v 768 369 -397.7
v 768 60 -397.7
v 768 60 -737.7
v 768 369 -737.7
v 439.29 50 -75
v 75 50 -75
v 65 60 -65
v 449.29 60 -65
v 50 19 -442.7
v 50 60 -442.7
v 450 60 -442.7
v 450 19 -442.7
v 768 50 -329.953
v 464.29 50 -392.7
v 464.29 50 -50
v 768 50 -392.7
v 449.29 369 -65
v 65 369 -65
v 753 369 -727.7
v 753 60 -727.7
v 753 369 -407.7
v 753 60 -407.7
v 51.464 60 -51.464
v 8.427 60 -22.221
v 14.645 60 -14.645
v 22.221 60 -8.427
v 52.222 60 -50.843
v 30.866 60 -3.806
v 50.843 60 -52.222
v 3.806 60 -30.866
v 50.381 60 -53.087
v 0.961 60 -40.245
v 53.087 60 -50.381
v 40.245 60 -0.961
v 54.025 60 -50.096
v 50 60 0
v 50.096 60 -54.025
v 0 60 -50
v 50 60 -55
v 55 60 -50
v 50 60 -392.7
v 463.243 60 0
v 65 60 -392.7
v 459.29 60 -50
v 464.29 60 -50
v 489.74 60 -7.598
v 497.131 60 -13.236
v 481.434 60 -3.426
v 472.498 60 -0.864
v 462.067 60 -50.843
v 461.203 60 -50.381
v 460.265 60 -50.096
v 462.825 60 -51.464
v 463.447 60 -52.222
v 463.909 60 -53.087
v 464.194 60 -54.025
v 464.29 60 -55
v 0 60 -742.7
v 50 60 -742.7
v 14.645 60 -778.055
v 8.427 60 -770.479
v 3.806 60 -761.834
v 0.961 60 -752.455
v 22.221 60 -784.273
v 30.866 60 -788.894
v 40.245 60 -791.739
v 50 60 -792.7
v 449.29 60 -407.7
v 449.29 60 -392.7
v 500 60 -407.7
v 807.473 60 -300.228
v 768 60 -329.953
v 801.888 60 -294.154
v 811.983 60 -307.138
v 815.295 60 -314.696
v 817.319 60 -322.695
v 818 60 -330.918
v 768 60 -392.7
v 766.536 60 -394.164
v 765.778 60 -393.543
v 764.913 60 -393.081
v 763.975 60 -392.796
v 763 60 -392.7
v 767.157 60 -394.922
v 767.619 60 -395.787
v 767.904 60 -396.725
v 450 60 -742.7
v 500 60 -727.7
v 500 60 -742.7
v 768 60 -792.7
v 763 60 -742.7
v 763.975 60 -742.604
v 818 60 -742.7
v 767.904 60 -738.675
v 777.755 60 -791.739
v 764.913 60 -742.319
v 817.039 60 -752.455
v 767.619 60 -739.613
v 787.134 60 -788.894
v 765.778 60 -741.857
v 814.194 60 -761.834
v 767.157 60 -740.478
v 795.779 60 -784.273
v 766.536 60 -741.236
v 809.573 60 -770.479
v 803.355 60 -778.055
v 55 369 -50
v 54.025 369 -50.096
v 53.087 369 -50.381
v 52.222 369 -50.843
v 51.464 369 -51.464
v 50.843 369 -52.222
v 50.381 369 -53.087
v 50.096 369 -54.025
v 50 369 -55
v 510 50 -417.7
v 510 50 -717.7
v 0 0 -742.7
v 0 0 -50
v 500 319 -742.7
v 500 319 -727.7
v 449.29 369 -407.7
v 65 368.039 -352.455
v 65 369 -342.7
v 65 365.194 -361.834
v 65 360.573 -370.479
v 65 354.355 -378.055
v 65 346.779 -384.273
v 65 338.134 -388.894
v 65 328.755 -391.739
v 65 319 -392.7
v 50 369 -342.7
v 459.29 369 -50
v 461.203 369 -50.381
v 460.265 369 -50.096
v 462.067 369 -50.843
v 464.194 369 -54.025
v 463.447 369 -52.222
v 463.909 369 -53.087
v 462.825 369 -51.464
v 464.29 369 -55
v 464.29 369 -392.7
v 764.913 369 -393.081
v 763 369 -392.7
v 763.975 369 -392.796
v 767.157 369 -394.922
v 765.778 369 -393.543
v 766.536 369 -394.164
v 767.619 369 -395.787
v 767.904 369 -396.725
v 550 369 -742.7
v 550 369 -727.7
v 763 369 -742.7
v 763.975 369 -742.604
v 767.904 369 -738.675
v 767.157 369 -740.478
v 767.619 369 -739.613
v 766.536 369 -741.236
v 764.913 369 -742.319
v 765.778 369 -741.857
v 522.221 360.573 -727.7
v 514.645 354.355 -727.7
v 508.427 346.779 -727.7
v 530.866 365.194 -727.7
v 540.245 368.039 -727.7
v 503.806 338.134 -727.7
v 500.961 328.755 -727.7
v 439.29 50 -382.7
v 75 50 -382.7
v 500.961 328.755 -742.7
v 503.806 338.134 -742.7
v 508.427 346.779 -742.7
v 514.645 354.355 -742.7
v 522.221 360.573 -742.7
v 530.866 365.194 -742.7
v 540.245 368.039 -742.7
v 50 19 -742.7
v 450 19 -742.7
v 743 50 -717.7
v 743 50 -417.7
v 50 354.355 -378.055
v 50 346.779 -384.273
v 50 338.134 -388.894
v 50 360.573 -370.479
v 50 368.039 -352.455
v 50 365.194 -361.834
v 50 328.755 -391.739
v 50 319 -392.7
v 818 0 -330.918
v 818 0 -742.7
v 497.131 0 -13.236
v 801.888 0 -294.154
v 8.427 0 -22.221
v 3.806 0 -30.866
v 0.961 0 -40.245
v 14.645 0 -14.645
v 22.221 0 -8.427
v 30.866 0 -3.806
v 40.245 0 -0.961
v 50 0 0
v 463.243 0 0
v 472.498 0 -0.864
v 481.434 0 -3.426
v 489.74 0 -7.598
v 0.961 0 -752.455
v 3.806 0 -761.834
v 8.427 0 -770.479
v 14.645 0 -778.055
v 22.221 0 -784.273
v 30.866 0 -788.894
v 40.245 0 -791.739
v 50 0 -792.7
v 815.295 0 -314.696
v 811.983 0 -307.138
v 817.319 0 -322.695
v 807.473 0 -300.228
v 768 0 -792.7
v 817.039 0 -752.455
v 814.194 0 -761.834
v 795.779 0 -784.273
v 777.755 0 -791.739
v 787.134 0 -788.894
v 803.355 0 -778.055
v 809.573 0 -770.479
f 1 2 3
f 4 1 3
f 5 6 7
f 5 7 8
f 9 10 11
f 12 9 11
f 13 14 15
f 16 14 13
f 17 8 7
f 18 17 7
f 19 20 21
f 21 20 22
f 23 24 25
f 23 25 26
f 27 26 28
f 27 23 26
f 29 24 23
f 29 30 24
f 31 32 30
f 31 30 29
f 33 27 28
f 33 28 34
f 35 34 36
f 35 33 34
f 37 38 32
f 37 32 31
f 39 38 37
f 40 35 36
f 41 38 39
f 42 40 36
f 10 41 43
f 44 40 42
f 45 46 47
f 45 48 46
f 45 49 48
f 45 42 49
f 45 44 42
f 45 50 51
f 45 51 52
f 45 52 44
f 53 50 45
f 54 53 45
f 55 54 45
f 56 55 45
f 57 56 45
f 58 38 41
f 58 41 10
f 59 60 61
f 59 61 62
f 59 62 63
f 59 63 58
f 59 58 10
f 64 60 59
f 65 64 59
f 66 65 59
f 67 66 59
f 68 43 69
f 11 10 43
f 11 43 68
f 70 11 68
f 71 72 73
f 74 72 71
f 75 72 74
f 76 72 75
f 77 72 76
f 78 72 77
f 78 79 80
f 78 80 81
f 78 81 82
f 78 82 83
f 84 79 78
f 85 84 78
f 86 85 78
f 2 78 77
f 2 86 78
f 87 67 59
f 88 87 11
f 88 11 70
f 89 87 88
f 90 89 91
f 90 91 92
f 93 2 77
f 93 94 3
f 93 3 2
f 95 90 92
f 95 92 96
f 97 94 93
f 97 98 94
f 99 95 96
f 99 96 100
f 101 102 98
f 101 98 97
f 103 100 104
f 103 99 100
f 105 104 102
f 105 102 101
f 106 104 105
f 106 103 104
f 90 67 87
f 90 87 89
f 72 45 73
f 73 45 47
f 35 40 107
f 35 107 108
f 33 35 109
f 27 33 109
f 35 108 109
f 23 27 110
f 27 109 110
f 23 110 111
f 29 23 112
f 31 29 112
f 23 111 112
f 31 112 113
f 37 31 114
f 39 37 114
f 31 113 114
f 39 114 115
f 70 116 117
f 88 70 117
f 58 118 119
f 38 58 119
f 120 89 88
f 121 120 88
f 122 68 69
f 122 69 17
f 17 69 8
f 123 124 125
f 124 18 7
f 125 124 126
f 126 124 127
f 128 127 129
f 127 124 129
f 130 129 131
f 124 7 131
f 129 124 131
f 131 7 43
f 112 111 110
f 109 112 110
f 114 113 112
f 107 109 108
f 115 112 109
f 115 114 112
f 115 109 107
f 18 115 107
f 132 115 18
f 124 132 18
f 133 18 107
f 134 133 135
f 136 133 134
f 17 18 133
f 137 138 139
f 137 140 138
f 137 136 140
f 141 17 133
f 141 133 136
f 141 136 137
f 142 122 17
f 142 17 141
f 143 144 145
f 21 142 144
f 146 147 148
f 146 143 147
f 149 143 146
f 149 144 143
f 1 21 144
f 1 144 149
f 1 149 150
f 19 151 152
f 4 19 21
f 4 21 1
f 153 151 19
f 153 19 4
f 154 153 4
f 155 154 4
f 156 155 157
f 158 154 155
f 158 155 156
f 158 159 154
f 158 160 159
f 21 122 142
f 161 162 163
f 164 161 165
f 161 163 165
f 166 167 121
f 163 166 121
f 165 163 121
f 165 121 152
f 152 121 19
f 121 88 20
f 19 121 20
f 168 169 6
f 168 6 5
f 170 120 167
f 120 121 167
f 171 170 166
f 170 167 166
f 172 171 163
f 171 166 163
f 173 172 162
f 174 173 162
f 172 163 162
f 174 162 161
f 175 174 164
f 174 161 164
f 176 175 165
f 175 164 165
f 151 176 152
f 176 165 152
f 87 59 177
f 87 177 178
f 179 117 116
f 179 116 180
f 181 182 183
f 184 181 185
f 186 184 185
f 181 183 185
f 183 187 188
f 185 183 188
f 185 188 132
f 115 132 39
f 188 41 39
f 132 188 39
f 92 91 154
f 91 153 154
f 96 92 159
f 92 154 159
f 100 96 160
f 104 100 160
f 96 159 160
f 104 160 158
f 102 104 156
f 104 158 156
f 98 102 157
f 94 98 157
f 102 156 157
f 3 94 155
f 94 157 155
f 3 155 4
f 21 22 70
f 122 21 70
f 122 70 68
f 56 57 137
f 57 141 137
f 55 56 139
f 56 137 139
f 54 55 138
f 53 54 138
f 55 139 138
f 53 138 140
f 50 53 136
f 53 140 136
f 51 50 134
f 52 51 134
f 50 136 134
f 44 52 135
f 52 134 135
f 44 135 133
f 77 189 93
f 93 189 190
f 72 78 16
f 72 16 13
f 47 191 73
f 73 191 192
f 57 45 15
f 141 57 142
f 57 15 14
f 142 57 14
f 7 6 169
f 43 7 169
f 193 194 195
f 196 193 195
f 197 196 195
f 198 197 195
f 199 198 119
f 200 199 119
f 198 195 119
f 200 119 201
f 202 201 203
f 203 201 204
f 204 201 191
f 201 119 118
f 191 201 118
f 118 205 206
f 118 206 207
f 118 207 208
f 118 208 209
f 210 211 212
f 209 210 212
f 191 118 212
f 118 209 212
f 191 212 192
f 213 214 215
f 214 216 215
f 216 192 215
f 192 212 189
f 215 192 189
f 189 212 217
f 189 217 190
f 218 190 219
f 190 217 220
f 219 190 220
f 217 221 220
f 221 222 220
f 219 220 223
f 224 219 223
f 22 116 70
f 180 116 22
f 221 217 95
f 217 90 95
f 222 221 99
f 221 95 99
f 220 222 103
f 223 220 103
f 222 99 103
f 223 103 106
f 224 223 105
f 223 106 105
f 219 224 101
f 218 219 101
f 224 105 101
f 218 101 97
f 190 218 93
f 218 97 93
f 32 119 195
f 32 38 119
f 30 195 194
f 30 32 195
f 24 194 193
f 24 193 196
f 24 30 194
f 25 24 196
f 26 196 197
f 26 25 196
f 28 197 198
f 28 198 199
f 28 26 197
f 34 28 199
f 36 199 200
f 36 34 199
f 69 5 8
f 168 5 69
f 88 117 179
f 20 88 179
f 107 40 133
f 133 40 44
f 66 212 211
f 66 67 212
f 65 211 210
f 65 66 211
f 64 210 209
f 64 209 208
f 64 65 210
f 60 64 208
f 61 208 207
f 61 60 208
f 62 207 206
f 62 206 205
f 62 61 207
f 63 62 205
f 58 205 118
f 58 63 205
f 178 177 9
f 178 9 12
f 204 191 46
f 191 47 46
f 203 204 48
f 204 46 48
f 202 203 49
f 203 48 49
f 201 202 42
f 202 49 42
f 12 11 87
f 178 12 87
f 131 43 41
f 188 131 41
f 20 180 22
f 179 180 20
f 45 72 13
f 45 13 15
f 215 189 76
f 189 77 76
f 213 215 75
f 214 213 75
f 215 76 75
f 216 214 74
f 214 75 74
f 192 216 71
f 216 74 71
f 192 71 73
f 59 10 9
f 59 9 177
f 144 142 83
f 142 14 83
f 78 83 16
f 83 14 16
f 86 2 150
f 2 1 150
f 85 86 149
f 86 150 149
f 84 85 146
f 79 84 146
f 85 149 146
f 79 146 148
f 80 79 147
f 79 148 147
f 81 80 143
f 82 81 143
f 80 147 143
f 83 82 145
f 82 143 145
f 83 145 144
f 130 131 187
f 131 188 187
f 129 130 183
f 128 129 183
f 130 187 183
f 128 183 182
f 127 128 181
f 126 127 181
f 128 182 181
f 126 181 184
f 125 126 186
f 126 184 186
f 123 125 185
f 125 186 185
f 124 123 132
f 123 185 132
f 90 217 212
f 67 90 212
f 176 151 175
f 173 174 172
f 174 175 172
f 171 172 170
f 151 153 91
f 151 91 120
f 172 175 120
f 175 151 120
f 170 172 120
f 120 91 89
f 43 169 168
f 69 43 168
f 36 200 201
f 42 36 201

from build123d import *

# Parameters (mm, degrees)
BOSS_EXTRUDE1_DEPTH = 60
SKETCH3_W           = 400
SKETCH3_H           = 300
CUT_EXTRUDE1_DEPTH  = 41
BOSS_EXTRUDE2_DEPTH = 350
BOSS_EXTRUDE3_DEPTH = 350
FILLET1_R           = 50
FILLET2_R           = 50
SKETCH6_W           = 253
SKETCH6_H           = 320
SKETCH6_W_2         = 384.289648178
SKETCH6_H_2         = 327.7
BOSS_EXTRUDE4_DEPTH = 31
CHAMFER5_SIZE       = 10
FILLET3_R           = 5


with BuildPart() as part:
    # Sketch1 → Boss-Extrude1 (new body)
    with BuildSketch(Plane(origin=(0, 0, 0), x_dir=(1, 0, 0), z_dir=(0, 1, 0))):
        Polygon((818, 792.7), (0, 792.7), (0, 0), (482.77197137, 0), (818, 309.005759394), align=None)
    extrude(amount=BOSS_EXTRUDE1_DEPTH)

    # Sketch3 → Cut-Extrude1 (cut)
    with BuildSketch(Plane(origin=(0, 60, 0), x_dir=(1, 0, 0), z_dir=(0, 1, 0))):
        with Locations((250, 592.7)):
            Rectangle(SKETCH3_W, SKETCH3_H)
        Polygon((168.605055776, 392.7), (500, 392.7), (500, 678.249343647), (500, 742.7), (768, 742.7), (768, 329.953464166), (464.289648178, 50), (50, 50), (50, 392.7), align=None)
    extrude(amount=-CUT_EXTRUDE1_DEPTH, mode=Mode.SUBTRACT)

    # Sketch4 → Boss-Extrude2 (add)
    with BuildSketch(Plane(origin=(0, 19, 0), x_dir=(1, 0, 0), z_dir=(0, 1, 0))):
        Polygon((464.289648178, 50), (464.289648178, 392.7), (449.289648178, 392.7), (449.289648178, 65), (65, 65), (65, 392.7), (50, 392.7), (50, 50), align=None)
    extrude(amount=BOSS_EXTRUDE2_DEPTH)

    # Sketch5 → Boss-Extrude3 (add)
    with BuildSketch(Plane(origin=(0, 19, 0), x_dir=(1, 0, 0), z_dir=(0, 1, 0))):
        Polygon((768, 392.7), (768, 742.7), (500, 742.7), (500, 727.7), (753, 727.7), (753, 407.7), (500, 407.7), (449.289648178, 407.7), (449.289648178, 392.7), align=None)
    extrude(amount=BOSS_EXTRUDE3_DEPTH)

    # Fillet1
    fillet1_edges = [part.edges().sort_by_distance(p)[0] for p in [
        (57.5, 369, -392.7),
        (500, 369, -735.2),
    ]]
    fillet(fillet1_edges, radius=FILLET1_R)

    # Fillet2
    fillet2_edges = [part.edges().sort_by_distance(p)[0] for p in [
        (0, 30, 0),
        (0, 30, -792.7),
        (818, 30, -792.7),
        (818, 30, -309.005759394),
        (482.77197137, 30, 0),
    ]]
    fillet(fillet2_edges, radius=FILLET2_R)

    # Sketch6 → Boss-Extrude4 (add)
    with BuildSketch(Plane(origin=(0, 19, 0), x_dir=(1, 0, 0), z_dir=(0, 1, 0))):
        Polygon((768, 392.7), (464.289648178, 392.7), (464.289648178, 50), (768, 329.953464166), align=None)
        with Locations((626.5, 567.7)):
            Rectangle(SKETCH6_W, SKETCH6_H)
        with Locations((257.144824089, 228.85)):
            Rectangle(SKETCH6_W_2, SKETCH6_H_2)
    extrude(amount=BOSS_EXTRUDE4_DEPTH)

    # Chamfer5
    chamfer5_edges = [part.edges().sort_by_distance(p)[0] for p in [
        (753, 50, -567.7),
        (626.5, 50, -727.7),
        (500, 50, -567.7),
        (626.5, 50, -407.7),
        (449.289648178, 50, -228.85),
        (257.144824089, 50, -392.7),
        (65, 50, -228.85),
        (257.144824089, 50, -65),
    ]]
    chamfer(chamfer5_edges, length=CHAMFER5_SIZE - 0.0001)  # a hair under: the kernel refuses the full size

    # Fillet3
    fillet3_edges = [part.edges().sort_by_distance(p)[0] for p in [
        (50, 214.5, -50),
        (464.289648178, 214.5, -50),
        (768, 214.5, -392.7),
        (768, 214.5, -742.7),
    ]]
    fillet(fillet3_edges, radius=FILLET3_R)


solid = part.part
